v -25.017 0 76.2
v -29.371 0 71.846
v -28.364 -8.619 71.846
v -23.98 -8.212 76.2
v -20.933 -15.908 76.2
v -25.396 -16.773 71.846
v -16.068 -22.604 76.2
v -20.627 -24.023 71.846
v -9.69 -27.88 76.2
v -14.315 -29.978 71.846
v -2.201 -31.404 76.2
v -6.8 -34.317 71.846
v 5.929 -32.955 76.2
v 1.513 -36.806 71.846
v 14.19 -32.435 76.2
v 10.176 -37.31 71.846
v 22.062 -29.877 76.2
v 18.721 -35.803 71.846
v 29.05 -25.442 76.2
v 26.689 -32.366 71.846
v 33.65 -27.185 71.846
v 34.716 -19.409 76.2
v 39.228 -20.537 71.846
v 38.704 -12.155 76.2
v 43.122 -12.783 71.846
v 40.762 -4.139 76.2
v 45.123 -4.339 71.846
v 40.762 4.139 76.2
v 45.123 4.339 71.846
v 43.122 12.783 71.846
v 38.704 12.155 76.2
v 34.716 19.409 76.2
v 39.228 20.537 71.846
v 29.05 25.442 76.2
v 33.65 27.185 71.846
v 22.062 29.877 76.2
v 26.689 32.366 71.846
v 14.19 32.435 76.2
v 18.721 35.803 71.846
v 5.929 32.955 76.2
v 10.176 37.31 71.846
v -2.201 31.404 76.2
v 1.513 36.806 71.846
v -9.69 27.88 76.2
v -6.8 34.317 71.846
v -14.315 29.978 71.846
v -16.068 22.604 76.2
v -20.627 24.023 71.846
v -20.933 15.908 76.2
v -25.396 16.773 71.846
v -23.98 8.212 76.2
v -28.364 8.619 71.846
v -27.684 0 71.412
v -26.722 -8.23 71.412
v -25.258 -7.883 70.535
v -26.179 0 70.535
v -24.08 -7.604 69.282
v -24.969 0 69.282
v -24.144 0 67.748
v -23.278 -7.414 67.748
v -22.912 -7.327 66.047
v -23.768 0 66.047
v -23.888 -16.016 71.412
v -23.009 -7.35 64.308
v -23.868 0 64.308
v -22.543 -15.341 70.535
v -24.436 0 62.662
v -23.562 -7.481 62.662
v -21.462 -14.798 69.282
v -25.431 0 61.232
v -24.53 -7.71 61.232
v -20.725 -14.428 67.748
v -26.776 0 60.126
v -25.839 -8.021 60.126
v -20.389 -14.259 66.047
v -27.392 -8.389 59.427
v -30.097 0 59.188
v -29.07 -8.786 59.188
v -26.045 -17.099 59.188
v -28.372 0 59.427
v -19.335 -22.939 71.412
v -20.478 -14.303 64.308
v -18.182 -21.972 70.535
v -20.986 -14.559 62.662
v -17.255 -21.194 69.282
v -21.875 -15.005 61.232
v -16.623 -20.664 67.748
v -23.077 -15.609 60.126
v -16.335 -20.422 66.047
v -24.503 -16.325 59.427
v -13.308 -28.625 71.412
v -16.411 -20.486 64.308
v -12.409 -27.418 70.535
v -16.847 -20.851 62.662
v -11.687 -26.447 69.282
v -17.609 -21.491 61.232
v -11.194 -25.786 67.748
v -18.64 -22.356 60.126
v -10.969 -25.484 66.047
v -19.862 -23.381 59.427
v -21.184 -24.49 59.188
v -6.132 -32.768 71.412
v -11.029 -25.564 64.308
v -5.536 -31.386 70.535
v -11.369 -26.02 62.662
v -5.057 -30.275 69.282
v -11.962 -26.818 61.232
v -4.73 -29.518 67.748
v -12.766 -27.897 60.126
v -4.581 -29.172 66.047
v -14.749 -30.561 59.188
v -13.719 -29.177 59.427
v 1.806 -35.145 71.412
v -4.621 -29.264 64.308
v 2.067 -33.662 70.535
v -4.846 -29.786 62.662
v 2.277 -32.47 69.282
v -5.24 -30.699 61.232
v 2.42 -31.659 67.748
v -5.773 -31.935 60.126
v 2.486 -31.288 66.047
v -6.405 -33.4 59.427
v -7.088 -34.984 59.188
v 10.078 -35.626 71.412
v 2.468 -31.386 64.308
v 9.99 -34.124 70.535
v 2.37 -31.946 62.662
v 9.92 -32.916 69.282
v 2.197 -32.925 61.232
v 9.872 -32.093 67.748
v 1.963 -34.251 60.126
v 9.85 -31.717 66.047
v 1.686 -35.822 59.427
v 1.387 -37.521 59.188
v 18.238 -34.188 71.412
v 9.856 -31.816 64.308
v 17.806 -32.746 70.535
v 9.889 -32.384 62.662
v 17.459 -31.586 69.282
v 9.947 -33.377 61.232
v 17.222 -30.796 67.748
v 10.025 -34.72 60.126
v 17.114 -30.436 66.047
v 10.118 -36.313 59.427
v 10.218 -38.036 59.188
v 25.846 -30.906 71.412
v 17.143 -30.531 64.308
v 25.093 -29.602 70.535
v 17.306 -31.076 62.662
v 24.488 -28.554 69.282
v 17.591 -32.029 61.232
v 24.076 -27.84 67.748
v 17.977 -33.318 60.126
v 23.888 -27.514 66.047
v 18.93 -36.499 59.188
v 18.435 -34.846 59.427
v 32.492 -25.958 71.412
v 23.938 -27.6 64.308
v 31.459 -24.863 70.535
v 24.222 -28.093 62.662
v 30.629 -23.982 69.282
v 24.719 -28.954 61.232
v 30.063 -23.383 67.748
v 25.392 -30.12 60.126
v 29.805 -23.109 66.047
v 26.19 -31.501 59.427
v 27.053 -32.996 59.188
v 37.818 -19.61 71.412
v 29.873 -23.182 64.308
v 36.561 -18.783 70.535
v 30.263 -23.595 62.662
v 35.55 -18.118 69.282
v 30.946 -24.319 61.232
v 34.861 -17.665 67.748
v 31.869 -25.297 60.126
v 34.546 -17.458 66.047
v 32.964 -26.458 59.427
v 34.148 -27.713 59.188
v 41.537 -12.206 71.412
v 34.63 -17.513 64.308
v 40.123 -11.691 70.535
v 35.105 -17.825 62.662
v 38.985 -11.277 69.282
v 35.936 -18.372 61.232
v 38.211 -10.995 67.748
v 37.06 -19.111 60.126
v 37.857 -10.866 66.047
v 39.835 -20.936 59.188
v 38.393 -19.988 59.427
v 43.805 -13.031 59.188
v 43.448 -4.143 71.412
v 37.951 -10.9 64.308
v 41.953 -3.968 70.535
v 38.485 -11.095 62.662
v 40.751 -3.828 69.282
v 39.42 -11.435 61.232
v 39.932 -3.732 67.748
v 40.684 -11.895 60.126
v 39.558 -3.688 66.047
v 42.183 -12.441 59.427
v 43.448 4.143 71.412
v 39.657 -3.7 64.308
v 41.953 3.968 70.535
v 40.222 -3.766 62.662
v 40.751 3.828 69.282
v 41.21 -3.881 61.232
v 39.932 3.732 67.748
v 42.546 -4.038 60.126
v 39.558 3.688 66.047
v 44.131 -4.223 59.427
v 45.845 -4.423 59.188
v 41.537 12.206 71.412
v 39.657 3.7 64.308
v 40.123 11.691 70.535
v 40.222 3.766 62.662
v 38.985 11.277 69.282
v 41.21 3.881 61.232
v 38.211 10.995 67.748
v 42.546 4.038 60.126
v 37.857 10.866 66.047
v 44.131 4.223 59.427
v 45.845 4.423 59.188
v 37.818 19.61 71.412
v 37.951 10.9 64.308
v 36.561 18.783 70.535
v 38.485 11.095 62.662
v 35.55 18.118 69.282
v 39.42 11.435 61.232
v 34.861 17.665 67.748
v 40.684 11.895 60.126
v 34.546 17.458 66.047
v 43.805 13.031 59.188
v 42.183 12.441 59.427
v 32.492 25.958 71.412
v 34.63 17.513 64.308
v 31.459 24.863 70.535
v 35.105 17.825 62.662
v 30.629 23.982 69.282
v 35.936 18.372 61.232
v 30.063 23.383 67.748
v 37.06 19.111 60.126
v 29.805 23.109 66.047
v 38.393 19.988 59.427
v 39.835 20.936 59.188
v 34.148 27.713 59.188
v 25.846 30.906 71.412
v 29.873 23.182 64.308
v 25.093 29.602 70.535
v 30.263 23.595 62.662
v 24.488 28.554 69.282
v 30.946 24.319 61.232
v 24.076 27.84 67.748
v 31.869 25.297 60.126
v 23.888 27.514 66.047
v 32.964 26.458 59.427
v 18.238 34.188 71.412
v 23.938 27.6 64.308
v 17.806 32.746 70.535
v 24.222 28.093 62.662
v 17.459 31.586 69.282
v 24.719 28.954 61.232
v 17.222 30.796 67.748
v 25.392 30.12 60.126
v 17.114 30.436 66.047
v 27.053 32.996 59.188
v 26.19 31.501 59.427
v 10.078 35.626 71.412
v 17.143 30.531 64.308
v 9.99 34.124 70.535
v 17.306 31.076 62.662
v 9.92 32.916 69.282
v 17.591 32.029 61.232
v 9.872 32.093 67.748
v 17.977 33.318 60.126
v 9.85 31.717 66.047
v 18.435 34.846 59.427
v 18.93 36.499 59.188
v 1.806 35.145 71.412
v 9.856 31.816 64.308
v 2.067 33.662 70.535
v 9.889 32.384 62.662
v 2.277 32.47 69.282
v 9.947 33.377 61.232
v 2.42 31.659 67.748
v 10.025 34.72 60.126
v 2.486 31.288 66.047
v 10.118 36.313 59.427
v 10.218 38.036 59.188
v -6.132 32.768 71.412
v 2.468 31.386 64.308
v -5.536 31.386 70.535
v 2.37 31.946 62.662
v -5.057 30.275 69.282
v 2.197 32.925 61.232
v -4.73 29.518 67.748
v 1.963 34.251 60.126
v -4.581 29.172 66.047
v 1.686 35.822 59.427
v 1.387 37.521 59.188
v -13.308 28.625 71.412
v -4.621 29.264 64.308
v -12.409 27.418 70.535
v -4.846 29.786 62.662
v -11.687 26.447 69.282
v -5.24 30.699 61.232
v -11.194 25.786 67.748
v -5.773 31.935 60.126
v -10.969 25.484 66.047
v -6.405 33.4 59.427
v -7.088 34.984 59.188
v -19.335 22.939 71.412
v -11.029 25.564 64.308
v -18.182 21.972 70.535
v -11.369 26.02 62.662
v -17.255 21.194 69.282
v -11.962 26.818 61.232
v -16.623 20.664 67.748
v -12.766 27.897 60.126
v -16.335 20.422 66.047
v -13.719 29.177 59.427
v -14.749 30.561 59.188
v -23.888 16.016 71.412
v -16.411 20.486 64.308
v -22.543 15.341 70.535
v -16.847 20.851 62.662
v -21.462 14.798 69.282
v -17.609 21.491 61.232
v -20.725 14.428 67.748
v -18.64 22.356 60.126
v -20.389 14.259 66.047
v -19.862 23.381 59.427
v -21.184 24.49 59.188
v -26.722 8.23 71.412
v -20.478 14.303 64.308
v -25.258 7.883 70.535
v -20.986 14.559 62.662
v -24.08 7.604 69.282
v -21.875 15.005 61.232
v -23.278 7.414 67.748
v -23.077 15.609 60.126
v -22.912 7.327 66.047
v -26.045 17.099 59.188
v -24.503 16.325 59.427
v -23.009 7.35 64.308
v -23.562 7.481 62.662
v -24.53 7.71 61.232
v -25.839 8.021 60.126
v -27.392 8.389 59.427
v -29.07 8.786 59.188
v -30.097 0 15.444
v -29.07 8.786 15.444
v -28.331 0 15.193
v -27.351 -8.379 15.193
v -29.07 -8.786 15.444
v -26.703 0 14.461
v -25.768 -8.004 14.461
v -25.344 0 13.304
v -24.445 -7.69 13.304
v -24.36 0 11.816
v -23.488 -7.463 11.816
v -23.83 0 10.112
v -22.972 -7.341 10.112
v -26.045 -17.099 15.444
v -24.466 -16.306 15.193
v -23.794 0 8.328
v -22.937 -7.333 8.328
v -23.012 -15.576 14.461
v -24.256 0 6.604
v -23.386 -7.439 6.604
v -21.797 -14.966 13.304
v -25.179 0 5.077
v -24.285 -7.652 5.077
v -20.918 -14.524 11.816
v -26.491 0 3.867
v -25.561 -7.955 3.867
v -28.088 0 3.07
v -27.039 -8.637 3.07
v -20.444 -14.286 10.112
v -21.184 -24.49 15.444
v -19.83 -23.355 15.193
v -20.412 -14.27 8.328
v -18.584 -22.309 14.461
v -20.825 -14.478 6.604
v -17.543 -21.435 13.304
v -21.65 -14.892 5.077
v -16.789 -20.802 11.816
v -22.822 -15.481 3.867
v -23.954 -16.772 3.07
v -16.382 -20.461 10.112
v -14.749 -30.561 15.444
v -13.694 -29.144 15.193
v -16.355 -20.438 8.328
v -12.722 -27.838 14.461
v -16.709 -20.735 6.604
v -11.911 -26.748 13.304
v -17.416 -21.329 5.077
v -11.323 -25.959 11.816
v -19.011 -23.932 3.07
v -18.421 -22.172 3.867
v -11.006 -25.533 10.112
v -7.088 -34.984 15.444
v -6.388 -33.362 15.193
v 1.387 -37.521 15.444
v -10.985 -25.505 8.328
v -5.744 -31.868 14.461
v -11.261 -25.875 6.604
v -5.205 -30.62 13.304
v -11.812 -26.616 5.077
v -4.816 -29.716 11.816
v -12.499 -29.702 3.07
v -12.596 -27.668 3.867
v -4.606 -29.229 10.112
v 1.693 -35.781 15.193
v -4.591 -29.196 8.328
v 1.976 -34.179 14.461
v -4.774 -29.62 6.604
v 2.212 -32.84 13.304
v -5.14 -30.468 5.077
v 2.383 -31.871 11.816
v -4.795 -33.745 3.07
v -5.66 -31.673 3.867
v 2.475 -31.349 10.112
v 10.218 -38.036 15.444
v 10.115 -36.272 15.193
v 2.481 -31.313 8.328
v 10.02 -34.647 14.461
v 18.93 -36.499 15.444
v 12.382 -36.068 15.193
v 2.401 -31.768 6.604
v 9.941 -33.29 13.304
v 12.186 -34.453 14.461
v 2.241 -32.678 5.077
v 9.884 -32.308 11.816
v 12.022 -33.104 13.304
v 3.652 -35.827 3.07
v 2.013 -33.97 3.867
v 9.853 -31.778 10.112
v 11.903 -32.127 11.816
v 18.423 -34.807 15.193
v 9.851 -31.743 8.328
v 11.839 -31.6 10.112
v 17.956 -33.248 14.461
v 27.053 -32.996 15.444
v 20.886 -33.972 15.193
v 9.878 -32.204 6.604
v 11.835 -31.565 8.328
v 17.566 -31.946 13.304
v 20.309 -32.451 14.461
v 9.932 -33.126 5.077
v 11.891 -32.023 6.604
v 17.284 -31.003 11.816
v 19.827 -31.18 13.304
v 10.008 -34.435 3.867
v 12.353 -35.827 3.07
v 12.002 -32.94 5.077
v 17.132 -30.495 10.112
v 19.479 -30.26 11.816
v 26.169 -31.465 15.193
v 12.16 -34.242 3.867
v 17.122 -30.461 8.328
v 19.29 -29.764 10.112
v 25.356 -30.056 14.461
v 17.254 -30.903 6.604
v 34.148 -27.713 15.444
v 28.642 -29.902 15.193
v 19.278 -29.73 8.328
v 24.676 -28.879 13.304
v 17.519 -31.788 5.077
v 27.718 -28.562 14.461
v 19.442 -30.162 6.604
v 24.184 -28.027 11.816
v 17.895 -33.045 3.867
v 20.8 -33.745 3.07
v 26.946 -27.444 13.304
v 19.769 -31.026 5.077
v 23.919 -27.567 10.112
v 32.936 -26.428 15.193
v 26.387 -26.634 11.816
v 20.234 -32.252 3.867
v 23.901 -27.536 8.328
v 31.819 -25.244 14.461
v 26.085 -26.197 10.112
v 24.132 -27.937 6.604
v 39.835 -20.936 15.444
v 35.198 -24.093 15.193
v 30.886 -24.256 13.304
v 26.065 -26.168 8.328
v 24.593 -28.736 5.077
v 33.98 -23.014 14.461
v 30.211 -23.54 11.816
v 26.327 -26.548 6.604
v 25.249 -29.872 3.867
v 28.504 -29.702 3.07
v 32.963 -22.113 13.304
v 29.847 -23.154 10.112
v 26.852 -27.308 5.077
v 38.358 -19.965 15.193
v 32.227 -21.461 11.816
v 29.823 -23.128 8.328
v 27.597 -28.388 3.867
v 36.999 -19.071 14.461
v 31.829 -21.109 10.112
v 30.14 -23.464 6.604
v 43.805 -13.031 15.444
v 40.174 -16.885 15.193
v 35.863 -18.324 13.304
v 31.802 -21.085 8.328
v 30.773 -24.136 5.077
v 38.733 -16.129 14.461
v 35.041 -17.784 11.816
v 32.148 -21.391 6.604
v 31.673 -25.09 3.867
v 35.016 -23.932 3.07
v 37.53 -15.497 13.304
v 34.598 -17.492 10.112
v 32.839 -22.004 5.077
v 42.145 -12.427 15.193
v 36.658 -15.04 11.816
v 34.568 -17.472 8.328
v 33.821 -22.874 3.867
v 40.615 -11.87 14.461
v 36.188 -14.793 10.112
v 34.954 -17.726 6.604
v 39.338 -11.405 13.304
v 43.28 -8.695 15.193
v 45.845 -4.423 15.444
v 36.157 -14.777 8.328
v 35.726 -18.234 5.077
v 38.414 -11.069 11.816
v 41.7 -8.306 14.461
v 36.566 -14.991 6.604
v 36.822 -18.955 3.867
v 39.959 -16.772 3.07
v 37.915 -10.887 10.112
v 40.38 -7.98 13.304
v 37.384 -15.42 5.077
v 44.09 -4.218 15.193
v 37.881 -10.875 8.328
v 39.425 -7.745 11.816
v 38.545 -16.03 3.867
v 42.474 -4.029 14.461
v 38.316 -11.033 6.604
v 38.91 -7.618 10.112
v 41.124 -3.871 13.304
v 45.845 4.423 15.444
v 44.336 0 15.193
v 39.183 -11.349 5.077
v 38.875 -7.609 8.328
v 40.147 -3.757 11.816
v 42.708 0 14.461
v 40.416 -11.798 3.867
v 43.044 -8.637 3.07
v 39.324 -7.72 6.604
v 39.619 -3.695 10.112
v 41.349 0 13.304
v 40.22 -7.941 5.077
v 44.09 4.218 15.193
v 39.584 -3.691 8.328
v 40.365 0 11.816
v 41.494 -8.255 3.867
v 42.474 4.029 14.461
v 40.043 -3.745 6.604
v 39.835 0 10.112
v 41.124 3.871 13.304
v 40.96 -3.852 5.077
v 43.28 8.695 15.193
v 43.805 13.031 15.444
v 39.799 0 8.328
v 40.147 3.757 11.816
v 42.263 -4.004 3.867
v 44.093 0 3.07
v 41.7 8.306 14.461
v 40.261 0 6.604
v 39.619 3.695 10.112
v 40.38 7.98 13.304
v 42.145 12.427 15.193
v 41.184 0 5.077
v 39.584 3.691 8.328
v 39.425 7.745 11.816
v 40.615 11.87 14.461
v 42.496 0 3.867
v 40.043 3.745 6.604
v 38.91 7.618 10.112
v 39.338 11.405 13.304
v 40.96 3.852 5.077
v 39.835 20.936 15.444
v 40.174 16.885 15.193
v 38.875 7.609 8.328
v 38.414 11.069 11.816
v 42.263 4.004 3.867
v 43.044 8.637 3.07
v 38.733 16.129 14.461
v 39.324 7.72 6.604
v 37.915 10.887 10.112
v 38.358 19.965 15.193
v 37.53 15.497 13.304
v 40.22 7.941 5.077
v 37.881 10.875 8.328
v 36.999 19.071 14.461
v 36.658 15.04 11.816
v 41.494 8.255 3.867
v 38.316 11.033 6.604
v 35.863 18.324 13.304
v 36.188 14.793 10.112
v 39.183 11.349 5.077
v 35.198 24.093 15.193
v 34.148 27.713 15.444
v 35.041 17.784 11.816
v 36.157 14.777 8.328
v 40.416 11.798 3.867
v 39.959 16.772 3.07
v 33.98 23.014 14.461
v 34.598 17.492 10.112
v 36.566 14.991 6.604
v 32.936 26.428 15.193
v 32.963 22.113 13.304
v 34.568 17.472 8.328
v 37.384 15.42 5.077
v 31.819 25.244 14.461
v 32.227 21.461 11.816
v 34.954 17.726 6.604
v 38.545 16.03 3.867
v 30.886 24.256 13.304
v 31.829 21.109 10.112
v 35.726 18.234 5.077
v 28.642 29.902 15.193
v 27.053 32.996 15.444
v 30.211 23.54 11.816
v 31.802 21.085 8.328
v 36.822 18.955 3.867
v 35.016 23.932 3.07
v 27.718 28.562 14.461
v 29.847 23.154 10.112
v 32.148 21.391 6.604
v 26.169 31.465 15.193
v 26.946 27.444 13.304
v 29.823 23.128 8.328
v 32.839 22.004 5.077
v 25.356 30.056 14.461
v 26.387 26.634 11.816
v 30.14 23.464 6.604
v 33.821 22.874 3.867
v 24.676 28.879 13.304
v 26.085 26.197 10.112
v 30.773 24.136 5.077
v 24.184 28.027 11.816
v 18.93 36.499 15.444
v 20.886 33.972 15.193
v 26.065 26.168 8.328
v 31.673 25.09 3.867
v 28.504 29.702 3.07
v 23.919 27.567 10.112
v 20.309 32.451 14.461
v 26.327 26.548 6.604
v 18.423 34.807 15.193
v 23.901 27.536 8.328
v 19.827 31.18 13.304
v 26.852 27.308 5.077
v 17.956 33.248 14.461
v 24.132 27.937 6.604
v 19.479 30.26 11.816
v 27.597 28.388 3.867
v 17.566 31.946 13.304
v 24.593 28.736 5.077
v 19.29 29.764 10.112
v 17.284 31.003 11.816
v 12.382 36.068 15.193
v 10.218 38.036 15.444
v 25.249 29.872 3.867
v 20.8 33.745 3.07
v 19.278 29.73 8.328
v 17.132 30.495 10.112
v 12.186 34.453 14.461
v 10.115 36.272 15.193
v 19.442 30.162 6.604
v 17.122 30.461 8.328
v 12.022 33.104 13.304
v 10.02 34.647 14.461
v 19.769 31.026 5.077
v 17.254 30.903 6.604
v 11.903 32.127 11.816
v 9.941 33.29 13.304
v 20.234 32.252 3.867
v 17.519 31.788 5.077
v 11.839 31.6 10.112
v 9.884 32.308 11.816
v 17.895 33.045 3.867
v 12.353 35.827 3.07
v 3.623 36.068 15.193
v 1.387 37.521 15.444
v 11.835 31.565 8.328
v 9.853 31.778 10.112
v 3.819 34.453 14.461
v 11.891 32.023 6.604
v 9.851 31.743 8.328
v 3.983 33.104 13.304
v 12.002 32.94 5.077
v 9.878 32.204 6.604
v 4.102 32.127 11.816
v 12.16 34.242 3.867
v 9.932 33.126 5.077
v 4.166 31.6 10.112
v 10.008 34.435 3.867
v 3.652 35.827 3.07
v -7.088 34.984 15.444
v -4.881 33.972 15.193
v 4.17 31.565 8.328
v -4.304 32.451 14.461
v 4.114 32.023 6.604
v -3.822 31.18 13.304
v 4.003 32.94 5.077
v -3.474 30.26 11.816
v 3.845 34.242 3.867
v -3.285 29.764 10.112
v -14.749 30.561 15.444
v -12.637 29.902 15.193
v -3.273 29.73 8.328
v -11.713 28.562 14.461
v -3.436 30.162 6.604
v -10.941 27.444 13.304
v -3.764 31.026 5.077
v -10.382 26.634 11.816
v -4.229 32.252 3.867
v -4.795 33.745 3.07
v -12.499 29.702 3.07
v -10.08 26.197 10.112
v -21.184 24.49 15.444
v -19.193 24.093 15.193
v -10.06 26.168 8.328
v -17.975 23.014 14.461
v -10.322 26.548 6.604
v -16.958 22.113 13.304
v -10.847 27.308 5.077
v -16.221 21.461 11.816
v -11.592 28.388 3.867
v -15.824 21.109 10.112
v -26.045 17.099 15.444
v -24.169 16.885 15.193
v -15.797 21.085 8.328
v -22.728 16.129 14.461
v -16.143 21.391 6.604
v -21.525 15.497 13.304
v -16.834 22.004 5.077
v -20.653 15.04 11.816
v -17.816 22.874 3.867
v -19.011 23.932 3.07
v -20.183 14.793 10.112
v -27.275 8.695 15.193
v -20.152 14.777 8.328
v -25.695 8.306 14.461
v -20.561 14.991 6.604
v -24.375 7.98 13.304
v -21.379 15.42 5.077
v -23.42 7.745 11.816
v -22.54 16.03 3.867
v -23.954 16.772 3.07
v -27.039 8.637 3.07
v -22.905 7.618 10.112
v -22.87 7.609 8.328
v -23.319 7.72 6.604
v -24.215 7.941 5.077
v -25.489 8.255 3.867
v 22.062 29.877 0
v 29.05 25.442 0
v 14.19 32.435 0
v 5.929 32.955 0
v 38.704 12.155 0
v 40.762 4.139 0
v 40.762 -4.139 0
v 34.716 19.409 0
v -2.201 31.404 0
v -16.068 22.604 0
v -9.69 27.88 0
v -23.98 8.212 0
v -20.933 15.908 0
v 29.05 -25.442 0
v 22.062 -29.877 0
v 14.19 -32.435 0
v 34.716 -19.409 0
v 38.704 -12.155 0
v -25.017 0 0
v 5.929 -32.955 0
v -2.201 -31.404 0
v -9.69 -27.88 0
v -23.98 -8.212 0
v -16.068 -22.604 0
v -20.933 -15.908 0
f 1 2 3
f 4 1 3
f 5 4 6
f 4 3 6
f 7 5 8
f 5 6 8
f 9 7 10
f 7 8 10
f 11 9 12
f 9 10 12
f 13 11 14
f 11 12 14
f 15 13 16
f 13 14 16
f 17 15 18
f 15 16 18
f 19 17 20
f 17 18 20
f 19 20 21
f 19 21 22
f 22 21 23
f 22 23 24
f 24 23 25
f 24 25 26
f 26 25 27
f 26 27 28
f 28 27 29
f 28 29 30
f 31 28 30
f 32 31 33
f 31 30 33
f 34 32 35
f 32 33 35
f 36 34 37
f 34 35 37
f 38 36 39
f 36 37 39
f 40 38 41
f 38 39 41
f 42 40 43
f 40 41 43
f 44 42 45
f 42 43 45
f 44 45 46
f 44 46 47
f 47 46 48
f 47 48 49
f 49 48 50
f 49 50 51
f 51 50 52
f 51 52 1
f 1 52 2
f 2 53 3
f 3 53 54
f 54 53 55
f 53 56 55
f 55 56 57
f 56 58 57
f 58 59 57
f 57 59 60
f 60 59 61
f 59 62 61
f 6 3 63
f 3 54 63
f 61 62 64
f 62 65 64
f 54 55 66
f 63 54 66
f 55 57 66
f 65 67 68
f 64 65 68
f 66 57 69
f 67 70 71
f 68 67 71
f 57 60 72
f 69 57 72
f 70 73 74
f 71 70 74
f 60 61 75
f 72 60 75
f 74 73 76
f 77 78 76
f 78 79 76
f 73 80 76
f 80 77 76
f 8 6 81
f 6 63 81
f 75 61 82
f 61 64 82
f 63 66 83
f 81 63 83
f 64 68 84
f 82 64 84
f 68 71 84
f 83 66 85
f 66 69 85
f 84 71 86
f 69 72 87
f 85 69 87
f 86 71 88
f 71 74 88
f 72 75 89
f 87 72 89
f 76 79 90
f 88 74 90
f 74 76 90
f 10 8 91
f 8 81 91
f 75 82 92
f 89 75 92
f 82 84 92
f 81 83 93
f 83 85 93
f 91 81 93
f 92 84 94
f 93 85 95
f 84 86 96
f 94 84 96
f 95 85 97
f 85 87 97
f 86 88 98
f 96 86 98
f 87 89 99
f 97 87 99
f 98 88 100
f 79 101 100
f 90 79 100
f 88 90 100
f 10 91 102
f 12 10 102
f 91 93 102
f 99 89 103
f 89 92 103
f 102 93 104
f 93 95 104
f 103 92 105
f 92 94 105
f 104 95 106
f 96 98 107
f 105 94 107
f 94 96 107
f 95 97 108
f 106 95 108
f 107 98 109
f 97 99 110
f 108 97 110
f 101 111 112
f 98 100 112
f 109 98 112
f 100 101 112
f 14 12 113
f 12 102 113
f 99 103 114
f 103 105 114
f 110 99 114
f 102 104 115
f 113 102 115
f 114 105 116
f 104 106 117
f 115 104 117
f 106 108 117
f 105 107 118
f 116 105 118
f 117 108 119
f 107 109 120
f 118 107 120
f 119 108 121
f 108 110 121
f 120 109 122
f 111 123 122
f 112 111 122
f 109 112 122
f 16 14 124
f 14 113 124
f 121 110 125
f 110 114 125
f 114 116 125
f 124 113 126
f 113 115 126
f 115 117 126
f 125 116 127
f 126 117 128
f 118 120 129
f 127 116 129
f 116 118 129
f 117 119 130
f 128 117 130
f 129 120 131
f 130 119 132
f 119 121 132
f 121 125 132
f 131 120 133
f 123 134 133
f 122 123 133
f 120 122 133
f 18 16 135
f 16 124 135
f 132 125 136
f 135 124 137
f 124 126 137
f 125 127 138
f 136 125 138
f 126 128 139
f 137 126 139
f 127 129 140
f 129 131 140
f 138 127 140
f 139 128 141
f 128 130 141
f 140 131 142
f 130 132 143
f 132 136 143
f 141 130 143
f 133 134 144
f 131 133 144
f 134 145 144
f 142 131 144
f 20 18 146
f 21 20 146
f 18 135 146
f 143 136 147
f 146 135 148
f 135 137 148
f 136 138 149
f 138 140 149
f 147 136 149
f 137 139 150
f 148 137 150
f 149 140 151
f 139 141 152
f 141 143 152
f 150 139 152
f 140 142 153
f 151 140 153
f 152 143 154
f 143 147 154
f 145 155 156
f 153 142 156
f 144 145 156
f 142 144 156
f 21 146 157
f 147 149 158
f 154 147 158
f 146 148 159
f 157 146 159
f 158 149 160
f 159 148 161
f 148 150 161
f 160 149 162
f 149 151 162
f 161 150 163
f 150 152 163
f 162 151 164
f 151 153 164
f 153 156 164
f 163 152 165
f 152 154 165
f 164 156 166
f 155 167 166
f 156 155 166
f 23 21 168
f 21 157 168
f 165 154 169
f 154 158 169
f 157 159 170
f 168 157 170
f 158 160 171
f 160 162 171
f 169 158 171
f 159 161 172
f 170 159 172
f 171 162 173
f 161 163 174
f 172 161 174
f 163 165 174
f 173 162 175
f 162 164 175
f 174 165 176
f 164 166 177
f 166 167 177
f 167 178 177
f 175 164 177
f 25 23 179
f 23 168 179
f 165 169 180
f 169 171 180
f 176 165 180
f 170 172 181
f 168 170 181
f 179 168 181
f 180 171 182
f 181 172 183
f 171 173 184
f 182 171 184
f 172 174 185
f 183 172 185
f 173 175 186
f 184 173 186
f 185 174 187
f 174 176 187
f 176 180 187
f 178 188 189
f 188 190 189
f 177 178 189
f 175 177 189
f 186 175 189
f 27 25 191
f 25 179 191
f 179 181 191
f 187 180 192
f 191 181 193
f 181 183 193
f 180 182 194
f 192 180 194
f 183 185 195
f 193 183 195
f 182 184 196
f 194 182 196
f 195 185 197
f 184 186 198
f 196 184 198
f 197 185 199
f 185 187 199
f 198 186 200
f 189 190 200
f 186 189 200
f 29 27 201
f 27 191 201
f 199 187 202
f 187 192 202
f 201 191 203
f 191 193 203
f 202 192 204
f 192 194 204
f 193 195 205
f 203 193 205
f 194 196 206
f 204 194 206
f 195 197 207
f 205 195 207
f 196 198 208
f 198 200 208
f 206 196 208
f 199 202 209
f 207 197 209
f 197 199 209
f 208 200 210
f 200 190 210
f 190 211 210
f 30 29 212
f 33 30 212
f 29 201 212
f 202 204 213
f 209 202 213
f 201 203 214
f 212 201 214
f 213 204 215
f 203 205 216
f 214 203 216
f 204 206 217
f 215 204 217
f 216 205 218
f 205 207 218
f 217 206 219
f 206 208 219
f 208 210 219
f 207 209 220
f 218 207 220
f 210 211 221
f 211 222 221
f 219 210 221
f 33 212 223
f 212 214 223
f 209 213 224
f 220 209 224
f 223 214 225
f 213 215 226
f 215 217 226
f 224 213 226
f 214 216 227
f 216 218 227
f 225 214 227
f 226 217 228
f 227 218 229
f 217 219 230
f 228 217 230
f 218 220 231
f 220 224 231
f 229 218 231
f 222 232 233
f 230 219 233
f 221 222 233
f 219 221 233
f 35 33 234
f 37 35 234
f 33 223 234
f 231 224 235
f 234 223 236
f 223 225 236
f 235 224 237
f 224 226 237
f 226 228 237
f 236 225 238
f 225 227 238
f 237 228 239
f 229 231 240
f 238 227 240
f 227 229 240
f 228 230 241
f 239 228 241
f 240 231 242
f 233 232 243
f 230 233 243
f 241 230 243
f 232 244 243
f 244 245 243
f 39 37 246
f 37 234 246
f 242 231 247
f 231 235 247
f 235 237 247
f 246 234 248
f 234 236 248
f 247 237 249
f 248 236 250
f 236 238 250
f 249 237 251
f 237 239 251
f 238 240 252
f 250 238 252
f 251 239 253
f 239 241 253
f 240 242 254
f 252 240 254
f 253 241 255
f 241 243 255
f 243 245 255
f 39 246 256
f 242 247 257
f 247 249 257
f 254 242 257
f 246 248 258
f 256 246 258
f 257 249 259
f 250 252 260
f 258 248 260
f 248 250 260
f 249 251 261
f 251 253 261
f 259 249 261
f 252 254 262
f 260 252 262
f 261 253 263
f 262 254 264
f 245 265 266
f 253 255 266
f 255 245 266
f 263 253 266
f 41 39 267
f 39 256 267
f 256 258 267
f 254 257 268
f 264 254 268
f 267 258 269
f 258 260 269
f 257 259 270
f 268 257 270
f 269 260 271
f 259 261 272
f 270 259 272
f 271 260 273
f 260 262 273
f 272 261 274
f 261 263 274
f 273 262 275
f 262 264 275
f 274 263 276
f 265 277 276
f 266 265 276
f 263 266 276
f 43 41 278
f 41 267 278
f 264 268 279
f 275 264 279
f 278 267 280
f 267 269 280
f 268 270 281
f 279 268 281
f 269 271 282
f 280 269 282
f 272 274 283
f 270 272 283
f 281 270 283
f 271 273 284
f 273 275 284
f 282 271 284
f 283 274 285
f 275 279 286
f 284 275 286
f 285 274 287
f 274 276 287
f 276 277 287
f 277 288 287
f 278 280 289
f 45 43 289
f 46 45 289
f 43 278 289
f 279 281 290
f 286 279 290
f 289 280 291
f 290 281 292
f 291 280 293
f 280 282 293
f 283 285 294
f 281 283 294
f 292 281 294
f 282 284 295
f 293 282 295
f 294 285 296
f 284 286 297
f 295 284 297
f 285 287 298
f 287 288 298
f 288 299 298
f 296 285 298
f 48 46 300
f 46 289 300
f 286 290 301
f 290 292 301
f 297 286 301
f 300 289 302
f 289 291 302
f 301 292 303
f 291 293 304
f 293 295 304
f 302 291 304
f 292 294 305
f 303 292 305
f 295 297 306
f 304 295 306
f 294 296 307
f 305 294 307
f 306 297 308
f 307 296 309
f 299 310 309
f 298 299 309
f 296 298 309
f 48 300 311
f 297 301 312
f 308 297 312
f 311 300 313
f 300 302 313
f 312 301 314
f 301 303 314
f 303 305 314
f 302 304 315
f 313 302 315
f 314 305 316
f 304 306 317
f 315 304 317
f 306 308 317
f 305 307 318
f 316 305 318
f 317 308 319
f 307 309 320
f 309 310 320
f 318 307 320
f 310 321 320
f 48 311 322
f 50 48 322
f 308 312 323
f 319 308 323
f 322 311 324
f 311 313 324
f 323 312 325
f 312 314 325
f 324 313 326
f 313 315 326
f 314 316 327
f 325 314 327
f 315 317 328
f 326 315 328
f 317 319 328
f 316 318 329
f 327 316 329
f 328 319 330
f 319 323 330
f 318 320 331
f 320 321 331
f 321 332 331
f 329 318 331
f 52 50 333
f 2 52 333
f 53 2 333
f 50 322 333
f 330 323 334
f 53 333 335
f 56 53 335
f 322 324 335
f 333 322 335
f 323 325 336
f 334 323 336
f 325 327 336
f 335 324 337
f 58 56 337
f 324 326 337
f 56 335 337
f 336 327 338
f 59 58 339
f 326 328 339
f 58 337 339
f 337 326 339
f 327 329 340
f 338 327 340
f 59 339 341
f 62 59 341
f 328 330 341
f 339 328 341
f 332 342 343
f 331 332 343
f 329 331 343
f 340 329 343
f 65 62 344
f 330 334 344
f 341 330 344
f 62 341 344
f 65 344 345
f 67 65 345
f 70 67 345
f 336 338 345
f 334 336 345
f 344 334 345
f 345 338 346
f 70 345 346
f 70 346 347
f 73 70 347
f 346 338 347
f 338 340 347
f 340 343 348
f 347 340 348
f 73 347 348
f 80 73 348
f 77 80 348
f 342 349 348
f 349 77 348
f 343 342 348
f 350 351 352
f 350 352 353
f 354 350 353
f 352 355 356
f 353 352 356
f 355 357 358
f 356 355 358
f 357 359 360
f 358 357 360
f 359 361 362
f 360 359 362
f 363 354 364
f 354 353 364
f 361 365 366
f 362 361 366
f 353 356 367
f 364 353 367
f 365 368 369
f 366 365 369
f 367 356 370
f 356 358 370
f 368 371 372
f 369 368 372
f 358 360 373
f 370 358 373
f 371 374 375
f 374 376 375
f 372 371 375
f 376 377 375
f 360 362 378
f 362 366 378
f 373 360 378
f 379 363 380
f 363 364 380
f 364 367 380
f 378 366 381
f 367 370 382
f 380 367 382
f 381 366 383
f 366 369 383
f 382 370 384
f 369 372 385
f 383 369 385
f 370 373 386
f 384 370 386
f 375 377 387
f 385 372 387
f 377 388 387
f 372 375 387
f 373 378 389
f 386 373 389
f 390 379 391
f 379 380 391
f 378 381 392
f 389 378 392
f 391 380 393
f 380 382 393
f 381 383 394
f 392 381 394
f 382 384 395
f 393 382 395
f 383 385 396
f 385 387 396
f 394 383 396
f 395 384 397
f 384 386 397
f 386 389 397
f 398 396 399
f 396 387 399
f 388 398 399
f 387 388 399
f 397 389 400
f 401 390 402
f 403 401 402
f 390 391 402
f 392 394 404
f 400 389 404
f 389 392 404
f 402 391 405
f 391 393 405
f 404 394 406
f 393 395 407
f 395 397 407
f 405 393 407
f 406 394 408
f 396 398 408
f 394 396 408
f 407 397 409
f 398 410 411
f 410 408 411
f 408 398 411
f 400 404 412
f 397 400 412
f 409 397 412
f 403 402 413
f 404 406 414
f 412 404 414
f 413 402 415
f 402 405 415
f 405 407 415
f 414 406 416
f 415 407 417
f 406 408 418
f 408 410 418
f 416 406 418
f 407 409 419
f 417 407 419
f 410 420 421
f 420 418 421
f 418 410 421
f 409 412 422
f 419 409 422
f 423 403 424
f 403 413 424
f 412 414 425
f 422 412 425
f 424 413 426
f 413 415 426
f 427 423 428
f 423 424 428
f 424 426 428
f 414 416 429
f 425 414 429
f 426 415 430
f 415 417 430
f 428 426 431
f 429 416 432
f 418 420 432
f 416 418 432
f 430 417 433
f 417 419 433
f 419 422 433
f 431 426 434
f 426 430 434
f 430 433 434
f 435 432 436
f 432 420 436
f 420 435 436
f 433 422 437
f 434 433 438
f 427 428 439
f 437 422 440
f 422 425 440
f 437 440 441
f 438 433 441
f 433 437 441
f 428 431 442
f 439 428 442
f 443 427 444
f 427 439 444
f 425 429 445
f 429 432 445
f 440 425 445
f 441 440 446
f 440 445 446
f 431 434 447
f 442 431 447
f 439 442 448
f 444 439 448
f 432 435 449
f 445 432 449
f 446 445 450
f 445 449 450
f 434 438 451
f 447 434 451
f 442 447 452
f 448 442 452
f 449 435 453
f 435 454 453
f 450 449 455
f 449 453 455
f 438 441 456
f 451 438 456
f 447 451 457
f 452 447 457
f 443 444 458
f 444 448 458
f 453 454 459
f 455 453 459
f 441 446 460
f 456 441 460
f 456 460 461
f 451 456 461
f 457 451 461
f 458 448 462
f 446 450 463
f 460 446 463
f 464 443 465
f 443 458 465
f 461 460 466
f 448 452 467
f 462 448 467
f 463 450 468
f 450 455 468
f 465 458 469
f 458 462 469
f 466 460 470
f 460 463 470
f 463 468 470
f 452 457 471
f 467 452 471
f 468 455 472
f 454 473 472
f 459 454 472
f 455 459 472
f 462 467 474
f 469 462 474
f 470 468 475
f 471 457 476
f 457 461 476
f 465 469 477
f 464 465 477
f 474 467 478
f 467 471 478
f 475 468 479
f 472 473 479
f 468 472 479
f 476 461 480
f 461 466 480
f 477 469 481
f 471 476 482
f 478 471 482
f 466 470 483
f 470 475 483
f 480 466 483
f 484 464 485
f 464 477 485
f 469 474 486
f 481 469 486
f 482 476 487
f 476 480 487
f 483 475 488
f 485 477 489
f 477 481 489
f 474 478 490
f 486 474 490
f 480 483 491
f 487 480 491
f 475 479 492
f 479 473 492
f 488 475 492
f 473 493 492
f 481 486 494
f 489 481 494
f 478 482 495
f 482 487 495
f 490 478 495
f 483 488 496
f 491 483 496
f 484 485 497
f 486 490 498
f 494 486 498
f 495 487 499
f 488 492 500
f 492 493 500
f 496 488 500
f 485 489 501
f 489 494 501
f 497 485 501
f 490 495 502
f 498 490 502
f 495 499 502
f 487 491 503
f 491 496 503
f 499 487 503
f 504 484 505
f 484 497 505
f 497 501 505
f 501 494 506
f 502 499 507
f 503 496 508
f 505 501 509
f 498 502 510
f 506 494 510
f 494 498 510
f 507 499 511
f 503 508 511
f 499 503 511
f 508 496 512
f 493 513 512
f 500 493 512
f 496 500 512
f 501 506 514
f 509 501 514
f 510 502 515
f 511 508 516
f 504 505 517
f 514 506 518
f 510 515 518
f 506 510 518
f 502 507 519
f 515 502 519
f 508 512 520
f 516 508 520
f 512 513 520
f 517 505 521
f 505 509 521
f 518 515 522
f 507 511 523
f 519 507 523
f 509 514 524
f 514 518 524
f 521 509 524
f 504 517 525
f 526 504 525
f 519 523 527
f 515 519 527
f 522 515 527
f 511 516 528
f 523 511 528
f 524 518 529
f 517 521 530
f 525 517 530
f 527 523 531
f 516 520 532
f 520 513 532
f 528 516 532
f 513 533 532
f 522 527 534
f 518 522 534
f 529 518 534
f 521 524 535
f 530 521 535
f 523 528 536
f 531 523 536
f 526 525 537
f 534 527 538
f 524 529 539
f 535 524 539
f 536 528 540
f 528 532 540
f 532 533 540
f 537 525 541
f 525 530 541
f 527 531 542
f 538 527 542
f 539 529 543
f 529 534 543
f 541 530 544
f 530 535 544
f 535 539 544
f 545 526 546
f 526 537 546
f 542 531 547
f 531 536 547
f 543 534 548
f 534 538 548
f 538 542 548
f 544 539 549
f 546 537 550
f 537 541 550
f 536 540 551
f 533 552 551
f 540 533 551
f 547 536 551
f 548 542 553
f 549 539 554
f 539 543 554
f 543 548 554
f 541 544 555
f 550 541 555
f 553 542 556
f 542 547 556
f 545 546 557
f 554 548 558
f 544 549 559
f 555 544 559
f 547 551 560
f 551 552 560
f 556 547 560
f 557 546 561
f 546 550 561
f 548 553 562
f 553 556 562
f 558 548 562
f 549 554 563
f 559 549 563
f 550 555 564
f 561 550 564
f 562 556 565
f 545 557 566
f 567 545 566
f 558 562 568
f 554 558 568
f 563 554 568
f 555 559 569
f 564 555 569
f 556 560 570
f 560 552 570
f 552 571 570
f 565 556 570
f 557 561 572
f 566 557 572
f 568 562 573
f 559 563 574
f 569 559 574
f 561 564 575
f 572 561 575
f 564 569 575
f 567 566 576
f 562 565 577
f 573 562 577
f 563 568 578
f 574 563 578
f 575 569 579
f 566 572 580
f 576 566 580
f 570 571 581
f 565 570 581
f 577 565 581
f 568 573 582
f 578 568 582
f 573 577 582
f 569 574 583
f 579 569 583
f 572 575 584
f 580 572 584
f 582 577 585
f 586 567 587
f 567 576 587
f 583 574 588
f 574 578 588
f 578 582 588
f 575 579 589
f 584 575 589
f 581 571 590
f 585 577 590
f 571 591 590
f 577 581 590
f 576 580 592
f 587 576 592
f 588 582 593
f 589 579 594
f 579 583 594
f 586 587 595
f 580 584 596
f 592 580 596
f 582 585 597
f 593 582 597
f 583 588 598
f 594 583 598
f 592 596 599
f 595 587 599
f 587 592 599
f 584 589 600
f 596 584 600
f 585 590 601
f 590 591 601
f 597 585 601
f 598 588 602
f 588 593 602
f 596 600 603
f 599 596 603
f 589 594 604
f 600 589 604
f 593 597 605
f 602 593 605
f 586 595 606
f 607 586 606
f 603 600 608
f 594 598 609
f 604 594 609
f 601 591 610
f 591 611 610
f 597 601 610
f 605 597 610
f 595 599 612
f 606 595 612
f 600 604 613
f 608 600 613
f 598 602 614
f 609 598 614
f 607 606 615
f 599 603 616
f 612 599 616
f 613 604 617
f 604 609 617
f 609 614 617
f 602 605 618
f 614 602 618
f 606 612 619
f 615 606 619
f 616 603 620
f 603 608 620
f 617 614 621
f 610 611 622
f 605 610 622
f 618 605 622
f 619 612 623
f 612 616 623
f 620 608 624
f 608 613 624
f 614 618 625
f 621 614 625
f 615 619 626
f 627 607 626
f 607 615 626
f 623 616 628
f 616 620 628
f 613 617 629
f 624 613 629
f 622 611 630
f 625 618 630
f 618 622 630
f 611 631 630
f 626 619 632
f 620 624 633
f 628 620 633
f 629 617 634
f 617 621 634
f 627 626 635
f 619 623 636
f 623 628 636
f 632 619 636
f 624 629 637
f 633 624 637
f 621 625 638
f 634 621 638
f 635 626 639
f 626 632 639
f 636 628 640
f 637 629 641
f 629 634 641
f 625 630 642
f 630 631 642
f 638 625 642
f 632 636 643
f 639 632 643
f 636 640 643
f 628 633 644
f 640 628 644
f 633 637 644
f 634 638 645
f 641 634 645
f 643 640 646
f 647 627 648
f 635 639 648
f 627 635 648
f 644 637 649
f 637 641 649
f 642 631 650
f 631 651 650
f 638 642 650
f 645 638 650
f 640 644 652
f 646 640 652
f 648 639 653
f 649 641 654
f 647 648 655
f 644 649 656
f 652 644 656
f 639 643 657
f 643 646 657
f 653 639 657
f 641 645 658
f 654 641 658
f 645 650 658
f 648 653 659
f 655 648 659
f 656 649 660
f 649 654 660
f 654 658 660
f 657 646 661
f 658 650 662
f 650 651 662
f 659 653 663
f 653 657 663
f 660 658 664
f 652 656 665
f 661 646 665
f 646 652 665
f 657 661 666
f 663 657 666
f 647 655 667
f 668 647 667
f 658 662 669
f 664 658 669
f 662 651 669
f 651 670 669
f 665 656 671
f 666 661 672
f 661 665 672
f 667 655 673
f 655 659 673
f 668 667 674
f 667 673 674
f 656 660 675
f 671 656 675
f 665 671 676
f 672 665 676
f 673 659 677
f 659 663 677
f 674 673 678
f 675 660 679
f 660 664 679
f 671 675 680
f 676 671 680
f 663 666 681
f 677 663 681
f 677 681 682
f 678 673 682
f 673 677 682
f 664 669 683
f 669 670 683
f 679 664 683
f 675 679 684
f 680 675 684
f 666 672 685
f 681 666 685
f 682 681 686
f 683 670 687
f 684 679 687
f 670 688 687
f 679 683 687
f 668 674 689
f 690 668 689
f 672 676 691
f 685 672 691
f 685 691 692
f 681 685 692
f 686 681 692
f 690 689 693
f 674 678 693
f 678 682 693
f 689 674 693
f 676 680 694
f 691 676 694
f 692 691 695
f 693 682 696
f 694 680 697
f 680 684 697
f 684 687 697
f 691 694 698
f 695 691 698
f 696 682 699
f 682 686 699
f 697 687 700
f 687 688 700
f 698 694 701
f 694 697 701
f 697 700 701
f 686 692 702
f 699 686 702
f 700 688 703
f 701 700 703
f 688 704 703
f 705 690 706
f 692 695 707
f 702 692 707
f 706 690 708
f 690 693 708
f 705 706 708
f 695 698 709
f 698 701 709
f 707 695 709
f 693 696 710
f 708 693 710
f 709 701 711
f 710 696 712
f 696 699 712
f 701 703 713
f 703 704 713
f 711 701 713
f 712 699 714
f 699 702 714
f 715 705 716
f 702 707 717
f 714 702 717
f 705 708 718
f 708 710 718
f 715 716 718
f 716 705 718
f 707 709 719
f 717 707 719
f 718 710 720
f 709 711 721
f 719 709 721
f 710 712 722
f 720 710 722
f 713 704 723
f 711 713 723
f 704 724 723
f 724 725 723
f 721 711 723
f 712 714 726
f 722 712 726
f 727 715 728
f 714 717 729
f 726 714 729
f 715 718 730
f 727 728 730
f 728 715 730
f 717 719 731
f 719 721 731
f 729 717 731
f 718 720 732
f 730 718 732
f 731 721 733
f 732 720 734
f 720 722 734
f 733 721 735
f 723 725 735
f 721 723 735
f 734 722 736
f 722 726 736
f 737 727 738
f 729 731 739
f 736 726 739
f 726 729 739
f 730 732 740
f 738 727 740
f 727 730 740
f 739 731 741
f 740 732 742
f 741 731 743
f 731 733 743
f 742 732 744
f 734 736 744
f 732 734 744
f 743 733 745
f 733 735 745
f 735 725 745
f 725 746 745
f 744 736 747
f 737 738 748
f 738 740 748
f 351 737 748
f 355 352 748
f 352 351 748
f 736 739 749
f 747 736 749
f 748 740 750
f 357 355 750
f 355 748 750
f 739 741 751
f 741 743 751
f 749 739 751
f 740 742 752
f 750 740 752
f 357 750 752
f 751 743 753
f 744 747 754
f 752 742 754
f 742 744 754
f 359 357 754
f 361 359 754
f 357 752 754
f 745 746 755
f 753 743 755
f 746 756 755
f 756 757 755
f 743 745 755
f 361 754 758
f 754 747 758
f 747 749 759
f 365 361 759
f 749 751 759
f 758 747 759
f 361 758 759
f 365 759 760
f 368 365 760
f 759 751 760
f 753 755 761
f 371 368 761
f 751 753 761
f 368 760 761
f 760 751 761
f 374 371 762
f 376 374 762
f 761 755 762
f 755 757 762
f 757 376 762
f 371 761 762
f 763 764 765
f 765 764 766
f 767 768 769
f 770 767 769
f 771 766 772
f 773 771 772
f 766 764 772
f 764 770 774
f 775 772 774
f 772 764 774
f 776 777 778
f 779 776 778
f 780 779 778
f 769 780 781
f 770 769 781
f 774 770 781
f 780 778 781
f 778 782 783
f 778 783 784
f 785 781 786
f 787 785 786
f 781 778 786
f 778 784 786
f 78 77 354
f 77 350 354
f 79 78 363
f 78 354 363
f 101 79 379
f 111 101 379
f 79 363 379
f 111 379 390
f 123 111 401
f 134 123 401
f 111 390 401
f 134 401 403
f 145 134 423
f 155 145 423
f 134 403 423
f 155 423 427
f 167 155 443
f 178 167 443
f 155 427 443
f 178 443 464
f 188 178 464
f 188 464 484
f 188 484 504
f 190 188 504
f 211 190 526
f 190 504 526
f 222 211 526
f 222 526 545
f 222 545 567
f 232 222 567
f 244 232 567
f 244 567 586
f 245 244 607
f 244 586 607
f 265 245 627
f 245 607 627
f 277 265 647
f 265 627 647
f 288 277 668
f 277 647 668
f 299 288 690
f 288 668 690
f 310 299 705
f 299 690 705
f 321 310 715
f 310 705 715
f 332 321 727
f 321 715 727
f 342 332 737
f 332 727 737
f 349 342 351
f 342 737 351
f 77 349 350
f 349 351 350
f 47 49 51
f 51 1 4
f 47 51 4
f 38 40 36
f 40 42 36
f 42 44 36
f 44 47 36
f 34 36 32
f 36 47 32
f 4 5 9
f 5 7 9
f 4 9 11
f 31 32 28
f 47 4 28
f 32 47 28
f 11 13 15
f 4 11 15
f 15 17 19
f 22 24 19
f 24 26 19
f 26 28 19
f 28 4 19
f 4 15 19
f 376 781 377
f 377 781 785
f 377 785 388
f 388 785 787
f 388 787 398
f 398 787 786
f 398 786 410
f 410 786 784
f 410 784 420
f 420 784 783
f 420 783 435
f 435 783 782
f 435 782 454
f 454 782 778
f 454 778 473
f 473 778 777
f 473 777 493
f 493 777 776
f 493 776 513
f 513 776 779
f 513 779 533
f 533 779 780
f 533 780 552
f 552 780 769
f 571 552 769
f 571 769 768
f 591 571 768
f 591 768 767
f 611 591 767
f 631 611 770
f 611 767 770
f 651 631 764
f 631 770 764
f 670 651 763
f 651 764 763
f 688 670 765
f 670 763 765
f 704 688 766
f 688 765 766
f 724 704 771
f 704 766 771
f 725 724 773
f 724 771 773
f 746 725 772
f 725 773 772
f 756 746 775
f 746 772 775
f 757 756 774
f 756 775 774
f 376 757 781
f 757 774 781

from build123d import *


# Not quite as in the source:
# - a fillet or chamfer that OpenCascade refuses, or shapes differently, is made with other operations: its cross-section is extruded or revolved along the edge and cut away or added


with BuildPart() as f2:
    # F0 (on Front) → F2 (revolve)
    with BuildSketch(Plane.XZ):
        with BuildLine():
            Line((-30.0974734128, 0), (8.0025265872, 0))
            Line((8.0025265872, 0), (8.0025265872, 76.2))
            Line((8.0025265872, 76.2), (-30.0974734128, 76.2))
            Line((-30.0974734128, 76.2), (-30.0974734128, 71.8881083488))
            ThreePointArc((-30.0974734128, 71.8881083488), (-23.7474734128, 65.5381083488), (-30.0974734128, 59.1881083488))
            Line((-30.0974734128, 59.1881083488), (-30.0974734128, 15.4437847272))
            ThreePointArc((-30.0974734128, 15.4437847272), (-23.7474734128, 9.0937847272), (-30.0974734128, 2.7437847272))
            Line((-30.0974734128, 2.7437847272), (-30.0974734128, 0))
        make_face()
    revolve(axis=Axis((8.0025265872, 0, 38.1), (0, 0, 1)))

    # F3: chamfer of 5.08 on 2 edges, made by hand

    # F3_s1 → F3_t2 (revolve, cut)
    with BuildSketch(Plane.XZ):
        Polygon((-25.0174734128, 76.2), (-30.0974734128, 71.12), (-30.0974734128, 76.2), align=None)
    revolve(axis=Axis((8.0025265872, 0, 76.2), (0, 0, 1)), mode=Mode.SUBTRACT)

    # F3_s3 → F3_t4 (revolve, cut)
    with BuildSketch(Plane.XZ):
        Polygon((-30.0974734128, 5.08), (-25.0174734128, 0), (-30.0974734128, 0), align=None)
    revolve(axis=Axis((8.0025265872, 0, 0), (0, 0, 1)), mode=Mode.SUBTRACT)


solid = f2.part
